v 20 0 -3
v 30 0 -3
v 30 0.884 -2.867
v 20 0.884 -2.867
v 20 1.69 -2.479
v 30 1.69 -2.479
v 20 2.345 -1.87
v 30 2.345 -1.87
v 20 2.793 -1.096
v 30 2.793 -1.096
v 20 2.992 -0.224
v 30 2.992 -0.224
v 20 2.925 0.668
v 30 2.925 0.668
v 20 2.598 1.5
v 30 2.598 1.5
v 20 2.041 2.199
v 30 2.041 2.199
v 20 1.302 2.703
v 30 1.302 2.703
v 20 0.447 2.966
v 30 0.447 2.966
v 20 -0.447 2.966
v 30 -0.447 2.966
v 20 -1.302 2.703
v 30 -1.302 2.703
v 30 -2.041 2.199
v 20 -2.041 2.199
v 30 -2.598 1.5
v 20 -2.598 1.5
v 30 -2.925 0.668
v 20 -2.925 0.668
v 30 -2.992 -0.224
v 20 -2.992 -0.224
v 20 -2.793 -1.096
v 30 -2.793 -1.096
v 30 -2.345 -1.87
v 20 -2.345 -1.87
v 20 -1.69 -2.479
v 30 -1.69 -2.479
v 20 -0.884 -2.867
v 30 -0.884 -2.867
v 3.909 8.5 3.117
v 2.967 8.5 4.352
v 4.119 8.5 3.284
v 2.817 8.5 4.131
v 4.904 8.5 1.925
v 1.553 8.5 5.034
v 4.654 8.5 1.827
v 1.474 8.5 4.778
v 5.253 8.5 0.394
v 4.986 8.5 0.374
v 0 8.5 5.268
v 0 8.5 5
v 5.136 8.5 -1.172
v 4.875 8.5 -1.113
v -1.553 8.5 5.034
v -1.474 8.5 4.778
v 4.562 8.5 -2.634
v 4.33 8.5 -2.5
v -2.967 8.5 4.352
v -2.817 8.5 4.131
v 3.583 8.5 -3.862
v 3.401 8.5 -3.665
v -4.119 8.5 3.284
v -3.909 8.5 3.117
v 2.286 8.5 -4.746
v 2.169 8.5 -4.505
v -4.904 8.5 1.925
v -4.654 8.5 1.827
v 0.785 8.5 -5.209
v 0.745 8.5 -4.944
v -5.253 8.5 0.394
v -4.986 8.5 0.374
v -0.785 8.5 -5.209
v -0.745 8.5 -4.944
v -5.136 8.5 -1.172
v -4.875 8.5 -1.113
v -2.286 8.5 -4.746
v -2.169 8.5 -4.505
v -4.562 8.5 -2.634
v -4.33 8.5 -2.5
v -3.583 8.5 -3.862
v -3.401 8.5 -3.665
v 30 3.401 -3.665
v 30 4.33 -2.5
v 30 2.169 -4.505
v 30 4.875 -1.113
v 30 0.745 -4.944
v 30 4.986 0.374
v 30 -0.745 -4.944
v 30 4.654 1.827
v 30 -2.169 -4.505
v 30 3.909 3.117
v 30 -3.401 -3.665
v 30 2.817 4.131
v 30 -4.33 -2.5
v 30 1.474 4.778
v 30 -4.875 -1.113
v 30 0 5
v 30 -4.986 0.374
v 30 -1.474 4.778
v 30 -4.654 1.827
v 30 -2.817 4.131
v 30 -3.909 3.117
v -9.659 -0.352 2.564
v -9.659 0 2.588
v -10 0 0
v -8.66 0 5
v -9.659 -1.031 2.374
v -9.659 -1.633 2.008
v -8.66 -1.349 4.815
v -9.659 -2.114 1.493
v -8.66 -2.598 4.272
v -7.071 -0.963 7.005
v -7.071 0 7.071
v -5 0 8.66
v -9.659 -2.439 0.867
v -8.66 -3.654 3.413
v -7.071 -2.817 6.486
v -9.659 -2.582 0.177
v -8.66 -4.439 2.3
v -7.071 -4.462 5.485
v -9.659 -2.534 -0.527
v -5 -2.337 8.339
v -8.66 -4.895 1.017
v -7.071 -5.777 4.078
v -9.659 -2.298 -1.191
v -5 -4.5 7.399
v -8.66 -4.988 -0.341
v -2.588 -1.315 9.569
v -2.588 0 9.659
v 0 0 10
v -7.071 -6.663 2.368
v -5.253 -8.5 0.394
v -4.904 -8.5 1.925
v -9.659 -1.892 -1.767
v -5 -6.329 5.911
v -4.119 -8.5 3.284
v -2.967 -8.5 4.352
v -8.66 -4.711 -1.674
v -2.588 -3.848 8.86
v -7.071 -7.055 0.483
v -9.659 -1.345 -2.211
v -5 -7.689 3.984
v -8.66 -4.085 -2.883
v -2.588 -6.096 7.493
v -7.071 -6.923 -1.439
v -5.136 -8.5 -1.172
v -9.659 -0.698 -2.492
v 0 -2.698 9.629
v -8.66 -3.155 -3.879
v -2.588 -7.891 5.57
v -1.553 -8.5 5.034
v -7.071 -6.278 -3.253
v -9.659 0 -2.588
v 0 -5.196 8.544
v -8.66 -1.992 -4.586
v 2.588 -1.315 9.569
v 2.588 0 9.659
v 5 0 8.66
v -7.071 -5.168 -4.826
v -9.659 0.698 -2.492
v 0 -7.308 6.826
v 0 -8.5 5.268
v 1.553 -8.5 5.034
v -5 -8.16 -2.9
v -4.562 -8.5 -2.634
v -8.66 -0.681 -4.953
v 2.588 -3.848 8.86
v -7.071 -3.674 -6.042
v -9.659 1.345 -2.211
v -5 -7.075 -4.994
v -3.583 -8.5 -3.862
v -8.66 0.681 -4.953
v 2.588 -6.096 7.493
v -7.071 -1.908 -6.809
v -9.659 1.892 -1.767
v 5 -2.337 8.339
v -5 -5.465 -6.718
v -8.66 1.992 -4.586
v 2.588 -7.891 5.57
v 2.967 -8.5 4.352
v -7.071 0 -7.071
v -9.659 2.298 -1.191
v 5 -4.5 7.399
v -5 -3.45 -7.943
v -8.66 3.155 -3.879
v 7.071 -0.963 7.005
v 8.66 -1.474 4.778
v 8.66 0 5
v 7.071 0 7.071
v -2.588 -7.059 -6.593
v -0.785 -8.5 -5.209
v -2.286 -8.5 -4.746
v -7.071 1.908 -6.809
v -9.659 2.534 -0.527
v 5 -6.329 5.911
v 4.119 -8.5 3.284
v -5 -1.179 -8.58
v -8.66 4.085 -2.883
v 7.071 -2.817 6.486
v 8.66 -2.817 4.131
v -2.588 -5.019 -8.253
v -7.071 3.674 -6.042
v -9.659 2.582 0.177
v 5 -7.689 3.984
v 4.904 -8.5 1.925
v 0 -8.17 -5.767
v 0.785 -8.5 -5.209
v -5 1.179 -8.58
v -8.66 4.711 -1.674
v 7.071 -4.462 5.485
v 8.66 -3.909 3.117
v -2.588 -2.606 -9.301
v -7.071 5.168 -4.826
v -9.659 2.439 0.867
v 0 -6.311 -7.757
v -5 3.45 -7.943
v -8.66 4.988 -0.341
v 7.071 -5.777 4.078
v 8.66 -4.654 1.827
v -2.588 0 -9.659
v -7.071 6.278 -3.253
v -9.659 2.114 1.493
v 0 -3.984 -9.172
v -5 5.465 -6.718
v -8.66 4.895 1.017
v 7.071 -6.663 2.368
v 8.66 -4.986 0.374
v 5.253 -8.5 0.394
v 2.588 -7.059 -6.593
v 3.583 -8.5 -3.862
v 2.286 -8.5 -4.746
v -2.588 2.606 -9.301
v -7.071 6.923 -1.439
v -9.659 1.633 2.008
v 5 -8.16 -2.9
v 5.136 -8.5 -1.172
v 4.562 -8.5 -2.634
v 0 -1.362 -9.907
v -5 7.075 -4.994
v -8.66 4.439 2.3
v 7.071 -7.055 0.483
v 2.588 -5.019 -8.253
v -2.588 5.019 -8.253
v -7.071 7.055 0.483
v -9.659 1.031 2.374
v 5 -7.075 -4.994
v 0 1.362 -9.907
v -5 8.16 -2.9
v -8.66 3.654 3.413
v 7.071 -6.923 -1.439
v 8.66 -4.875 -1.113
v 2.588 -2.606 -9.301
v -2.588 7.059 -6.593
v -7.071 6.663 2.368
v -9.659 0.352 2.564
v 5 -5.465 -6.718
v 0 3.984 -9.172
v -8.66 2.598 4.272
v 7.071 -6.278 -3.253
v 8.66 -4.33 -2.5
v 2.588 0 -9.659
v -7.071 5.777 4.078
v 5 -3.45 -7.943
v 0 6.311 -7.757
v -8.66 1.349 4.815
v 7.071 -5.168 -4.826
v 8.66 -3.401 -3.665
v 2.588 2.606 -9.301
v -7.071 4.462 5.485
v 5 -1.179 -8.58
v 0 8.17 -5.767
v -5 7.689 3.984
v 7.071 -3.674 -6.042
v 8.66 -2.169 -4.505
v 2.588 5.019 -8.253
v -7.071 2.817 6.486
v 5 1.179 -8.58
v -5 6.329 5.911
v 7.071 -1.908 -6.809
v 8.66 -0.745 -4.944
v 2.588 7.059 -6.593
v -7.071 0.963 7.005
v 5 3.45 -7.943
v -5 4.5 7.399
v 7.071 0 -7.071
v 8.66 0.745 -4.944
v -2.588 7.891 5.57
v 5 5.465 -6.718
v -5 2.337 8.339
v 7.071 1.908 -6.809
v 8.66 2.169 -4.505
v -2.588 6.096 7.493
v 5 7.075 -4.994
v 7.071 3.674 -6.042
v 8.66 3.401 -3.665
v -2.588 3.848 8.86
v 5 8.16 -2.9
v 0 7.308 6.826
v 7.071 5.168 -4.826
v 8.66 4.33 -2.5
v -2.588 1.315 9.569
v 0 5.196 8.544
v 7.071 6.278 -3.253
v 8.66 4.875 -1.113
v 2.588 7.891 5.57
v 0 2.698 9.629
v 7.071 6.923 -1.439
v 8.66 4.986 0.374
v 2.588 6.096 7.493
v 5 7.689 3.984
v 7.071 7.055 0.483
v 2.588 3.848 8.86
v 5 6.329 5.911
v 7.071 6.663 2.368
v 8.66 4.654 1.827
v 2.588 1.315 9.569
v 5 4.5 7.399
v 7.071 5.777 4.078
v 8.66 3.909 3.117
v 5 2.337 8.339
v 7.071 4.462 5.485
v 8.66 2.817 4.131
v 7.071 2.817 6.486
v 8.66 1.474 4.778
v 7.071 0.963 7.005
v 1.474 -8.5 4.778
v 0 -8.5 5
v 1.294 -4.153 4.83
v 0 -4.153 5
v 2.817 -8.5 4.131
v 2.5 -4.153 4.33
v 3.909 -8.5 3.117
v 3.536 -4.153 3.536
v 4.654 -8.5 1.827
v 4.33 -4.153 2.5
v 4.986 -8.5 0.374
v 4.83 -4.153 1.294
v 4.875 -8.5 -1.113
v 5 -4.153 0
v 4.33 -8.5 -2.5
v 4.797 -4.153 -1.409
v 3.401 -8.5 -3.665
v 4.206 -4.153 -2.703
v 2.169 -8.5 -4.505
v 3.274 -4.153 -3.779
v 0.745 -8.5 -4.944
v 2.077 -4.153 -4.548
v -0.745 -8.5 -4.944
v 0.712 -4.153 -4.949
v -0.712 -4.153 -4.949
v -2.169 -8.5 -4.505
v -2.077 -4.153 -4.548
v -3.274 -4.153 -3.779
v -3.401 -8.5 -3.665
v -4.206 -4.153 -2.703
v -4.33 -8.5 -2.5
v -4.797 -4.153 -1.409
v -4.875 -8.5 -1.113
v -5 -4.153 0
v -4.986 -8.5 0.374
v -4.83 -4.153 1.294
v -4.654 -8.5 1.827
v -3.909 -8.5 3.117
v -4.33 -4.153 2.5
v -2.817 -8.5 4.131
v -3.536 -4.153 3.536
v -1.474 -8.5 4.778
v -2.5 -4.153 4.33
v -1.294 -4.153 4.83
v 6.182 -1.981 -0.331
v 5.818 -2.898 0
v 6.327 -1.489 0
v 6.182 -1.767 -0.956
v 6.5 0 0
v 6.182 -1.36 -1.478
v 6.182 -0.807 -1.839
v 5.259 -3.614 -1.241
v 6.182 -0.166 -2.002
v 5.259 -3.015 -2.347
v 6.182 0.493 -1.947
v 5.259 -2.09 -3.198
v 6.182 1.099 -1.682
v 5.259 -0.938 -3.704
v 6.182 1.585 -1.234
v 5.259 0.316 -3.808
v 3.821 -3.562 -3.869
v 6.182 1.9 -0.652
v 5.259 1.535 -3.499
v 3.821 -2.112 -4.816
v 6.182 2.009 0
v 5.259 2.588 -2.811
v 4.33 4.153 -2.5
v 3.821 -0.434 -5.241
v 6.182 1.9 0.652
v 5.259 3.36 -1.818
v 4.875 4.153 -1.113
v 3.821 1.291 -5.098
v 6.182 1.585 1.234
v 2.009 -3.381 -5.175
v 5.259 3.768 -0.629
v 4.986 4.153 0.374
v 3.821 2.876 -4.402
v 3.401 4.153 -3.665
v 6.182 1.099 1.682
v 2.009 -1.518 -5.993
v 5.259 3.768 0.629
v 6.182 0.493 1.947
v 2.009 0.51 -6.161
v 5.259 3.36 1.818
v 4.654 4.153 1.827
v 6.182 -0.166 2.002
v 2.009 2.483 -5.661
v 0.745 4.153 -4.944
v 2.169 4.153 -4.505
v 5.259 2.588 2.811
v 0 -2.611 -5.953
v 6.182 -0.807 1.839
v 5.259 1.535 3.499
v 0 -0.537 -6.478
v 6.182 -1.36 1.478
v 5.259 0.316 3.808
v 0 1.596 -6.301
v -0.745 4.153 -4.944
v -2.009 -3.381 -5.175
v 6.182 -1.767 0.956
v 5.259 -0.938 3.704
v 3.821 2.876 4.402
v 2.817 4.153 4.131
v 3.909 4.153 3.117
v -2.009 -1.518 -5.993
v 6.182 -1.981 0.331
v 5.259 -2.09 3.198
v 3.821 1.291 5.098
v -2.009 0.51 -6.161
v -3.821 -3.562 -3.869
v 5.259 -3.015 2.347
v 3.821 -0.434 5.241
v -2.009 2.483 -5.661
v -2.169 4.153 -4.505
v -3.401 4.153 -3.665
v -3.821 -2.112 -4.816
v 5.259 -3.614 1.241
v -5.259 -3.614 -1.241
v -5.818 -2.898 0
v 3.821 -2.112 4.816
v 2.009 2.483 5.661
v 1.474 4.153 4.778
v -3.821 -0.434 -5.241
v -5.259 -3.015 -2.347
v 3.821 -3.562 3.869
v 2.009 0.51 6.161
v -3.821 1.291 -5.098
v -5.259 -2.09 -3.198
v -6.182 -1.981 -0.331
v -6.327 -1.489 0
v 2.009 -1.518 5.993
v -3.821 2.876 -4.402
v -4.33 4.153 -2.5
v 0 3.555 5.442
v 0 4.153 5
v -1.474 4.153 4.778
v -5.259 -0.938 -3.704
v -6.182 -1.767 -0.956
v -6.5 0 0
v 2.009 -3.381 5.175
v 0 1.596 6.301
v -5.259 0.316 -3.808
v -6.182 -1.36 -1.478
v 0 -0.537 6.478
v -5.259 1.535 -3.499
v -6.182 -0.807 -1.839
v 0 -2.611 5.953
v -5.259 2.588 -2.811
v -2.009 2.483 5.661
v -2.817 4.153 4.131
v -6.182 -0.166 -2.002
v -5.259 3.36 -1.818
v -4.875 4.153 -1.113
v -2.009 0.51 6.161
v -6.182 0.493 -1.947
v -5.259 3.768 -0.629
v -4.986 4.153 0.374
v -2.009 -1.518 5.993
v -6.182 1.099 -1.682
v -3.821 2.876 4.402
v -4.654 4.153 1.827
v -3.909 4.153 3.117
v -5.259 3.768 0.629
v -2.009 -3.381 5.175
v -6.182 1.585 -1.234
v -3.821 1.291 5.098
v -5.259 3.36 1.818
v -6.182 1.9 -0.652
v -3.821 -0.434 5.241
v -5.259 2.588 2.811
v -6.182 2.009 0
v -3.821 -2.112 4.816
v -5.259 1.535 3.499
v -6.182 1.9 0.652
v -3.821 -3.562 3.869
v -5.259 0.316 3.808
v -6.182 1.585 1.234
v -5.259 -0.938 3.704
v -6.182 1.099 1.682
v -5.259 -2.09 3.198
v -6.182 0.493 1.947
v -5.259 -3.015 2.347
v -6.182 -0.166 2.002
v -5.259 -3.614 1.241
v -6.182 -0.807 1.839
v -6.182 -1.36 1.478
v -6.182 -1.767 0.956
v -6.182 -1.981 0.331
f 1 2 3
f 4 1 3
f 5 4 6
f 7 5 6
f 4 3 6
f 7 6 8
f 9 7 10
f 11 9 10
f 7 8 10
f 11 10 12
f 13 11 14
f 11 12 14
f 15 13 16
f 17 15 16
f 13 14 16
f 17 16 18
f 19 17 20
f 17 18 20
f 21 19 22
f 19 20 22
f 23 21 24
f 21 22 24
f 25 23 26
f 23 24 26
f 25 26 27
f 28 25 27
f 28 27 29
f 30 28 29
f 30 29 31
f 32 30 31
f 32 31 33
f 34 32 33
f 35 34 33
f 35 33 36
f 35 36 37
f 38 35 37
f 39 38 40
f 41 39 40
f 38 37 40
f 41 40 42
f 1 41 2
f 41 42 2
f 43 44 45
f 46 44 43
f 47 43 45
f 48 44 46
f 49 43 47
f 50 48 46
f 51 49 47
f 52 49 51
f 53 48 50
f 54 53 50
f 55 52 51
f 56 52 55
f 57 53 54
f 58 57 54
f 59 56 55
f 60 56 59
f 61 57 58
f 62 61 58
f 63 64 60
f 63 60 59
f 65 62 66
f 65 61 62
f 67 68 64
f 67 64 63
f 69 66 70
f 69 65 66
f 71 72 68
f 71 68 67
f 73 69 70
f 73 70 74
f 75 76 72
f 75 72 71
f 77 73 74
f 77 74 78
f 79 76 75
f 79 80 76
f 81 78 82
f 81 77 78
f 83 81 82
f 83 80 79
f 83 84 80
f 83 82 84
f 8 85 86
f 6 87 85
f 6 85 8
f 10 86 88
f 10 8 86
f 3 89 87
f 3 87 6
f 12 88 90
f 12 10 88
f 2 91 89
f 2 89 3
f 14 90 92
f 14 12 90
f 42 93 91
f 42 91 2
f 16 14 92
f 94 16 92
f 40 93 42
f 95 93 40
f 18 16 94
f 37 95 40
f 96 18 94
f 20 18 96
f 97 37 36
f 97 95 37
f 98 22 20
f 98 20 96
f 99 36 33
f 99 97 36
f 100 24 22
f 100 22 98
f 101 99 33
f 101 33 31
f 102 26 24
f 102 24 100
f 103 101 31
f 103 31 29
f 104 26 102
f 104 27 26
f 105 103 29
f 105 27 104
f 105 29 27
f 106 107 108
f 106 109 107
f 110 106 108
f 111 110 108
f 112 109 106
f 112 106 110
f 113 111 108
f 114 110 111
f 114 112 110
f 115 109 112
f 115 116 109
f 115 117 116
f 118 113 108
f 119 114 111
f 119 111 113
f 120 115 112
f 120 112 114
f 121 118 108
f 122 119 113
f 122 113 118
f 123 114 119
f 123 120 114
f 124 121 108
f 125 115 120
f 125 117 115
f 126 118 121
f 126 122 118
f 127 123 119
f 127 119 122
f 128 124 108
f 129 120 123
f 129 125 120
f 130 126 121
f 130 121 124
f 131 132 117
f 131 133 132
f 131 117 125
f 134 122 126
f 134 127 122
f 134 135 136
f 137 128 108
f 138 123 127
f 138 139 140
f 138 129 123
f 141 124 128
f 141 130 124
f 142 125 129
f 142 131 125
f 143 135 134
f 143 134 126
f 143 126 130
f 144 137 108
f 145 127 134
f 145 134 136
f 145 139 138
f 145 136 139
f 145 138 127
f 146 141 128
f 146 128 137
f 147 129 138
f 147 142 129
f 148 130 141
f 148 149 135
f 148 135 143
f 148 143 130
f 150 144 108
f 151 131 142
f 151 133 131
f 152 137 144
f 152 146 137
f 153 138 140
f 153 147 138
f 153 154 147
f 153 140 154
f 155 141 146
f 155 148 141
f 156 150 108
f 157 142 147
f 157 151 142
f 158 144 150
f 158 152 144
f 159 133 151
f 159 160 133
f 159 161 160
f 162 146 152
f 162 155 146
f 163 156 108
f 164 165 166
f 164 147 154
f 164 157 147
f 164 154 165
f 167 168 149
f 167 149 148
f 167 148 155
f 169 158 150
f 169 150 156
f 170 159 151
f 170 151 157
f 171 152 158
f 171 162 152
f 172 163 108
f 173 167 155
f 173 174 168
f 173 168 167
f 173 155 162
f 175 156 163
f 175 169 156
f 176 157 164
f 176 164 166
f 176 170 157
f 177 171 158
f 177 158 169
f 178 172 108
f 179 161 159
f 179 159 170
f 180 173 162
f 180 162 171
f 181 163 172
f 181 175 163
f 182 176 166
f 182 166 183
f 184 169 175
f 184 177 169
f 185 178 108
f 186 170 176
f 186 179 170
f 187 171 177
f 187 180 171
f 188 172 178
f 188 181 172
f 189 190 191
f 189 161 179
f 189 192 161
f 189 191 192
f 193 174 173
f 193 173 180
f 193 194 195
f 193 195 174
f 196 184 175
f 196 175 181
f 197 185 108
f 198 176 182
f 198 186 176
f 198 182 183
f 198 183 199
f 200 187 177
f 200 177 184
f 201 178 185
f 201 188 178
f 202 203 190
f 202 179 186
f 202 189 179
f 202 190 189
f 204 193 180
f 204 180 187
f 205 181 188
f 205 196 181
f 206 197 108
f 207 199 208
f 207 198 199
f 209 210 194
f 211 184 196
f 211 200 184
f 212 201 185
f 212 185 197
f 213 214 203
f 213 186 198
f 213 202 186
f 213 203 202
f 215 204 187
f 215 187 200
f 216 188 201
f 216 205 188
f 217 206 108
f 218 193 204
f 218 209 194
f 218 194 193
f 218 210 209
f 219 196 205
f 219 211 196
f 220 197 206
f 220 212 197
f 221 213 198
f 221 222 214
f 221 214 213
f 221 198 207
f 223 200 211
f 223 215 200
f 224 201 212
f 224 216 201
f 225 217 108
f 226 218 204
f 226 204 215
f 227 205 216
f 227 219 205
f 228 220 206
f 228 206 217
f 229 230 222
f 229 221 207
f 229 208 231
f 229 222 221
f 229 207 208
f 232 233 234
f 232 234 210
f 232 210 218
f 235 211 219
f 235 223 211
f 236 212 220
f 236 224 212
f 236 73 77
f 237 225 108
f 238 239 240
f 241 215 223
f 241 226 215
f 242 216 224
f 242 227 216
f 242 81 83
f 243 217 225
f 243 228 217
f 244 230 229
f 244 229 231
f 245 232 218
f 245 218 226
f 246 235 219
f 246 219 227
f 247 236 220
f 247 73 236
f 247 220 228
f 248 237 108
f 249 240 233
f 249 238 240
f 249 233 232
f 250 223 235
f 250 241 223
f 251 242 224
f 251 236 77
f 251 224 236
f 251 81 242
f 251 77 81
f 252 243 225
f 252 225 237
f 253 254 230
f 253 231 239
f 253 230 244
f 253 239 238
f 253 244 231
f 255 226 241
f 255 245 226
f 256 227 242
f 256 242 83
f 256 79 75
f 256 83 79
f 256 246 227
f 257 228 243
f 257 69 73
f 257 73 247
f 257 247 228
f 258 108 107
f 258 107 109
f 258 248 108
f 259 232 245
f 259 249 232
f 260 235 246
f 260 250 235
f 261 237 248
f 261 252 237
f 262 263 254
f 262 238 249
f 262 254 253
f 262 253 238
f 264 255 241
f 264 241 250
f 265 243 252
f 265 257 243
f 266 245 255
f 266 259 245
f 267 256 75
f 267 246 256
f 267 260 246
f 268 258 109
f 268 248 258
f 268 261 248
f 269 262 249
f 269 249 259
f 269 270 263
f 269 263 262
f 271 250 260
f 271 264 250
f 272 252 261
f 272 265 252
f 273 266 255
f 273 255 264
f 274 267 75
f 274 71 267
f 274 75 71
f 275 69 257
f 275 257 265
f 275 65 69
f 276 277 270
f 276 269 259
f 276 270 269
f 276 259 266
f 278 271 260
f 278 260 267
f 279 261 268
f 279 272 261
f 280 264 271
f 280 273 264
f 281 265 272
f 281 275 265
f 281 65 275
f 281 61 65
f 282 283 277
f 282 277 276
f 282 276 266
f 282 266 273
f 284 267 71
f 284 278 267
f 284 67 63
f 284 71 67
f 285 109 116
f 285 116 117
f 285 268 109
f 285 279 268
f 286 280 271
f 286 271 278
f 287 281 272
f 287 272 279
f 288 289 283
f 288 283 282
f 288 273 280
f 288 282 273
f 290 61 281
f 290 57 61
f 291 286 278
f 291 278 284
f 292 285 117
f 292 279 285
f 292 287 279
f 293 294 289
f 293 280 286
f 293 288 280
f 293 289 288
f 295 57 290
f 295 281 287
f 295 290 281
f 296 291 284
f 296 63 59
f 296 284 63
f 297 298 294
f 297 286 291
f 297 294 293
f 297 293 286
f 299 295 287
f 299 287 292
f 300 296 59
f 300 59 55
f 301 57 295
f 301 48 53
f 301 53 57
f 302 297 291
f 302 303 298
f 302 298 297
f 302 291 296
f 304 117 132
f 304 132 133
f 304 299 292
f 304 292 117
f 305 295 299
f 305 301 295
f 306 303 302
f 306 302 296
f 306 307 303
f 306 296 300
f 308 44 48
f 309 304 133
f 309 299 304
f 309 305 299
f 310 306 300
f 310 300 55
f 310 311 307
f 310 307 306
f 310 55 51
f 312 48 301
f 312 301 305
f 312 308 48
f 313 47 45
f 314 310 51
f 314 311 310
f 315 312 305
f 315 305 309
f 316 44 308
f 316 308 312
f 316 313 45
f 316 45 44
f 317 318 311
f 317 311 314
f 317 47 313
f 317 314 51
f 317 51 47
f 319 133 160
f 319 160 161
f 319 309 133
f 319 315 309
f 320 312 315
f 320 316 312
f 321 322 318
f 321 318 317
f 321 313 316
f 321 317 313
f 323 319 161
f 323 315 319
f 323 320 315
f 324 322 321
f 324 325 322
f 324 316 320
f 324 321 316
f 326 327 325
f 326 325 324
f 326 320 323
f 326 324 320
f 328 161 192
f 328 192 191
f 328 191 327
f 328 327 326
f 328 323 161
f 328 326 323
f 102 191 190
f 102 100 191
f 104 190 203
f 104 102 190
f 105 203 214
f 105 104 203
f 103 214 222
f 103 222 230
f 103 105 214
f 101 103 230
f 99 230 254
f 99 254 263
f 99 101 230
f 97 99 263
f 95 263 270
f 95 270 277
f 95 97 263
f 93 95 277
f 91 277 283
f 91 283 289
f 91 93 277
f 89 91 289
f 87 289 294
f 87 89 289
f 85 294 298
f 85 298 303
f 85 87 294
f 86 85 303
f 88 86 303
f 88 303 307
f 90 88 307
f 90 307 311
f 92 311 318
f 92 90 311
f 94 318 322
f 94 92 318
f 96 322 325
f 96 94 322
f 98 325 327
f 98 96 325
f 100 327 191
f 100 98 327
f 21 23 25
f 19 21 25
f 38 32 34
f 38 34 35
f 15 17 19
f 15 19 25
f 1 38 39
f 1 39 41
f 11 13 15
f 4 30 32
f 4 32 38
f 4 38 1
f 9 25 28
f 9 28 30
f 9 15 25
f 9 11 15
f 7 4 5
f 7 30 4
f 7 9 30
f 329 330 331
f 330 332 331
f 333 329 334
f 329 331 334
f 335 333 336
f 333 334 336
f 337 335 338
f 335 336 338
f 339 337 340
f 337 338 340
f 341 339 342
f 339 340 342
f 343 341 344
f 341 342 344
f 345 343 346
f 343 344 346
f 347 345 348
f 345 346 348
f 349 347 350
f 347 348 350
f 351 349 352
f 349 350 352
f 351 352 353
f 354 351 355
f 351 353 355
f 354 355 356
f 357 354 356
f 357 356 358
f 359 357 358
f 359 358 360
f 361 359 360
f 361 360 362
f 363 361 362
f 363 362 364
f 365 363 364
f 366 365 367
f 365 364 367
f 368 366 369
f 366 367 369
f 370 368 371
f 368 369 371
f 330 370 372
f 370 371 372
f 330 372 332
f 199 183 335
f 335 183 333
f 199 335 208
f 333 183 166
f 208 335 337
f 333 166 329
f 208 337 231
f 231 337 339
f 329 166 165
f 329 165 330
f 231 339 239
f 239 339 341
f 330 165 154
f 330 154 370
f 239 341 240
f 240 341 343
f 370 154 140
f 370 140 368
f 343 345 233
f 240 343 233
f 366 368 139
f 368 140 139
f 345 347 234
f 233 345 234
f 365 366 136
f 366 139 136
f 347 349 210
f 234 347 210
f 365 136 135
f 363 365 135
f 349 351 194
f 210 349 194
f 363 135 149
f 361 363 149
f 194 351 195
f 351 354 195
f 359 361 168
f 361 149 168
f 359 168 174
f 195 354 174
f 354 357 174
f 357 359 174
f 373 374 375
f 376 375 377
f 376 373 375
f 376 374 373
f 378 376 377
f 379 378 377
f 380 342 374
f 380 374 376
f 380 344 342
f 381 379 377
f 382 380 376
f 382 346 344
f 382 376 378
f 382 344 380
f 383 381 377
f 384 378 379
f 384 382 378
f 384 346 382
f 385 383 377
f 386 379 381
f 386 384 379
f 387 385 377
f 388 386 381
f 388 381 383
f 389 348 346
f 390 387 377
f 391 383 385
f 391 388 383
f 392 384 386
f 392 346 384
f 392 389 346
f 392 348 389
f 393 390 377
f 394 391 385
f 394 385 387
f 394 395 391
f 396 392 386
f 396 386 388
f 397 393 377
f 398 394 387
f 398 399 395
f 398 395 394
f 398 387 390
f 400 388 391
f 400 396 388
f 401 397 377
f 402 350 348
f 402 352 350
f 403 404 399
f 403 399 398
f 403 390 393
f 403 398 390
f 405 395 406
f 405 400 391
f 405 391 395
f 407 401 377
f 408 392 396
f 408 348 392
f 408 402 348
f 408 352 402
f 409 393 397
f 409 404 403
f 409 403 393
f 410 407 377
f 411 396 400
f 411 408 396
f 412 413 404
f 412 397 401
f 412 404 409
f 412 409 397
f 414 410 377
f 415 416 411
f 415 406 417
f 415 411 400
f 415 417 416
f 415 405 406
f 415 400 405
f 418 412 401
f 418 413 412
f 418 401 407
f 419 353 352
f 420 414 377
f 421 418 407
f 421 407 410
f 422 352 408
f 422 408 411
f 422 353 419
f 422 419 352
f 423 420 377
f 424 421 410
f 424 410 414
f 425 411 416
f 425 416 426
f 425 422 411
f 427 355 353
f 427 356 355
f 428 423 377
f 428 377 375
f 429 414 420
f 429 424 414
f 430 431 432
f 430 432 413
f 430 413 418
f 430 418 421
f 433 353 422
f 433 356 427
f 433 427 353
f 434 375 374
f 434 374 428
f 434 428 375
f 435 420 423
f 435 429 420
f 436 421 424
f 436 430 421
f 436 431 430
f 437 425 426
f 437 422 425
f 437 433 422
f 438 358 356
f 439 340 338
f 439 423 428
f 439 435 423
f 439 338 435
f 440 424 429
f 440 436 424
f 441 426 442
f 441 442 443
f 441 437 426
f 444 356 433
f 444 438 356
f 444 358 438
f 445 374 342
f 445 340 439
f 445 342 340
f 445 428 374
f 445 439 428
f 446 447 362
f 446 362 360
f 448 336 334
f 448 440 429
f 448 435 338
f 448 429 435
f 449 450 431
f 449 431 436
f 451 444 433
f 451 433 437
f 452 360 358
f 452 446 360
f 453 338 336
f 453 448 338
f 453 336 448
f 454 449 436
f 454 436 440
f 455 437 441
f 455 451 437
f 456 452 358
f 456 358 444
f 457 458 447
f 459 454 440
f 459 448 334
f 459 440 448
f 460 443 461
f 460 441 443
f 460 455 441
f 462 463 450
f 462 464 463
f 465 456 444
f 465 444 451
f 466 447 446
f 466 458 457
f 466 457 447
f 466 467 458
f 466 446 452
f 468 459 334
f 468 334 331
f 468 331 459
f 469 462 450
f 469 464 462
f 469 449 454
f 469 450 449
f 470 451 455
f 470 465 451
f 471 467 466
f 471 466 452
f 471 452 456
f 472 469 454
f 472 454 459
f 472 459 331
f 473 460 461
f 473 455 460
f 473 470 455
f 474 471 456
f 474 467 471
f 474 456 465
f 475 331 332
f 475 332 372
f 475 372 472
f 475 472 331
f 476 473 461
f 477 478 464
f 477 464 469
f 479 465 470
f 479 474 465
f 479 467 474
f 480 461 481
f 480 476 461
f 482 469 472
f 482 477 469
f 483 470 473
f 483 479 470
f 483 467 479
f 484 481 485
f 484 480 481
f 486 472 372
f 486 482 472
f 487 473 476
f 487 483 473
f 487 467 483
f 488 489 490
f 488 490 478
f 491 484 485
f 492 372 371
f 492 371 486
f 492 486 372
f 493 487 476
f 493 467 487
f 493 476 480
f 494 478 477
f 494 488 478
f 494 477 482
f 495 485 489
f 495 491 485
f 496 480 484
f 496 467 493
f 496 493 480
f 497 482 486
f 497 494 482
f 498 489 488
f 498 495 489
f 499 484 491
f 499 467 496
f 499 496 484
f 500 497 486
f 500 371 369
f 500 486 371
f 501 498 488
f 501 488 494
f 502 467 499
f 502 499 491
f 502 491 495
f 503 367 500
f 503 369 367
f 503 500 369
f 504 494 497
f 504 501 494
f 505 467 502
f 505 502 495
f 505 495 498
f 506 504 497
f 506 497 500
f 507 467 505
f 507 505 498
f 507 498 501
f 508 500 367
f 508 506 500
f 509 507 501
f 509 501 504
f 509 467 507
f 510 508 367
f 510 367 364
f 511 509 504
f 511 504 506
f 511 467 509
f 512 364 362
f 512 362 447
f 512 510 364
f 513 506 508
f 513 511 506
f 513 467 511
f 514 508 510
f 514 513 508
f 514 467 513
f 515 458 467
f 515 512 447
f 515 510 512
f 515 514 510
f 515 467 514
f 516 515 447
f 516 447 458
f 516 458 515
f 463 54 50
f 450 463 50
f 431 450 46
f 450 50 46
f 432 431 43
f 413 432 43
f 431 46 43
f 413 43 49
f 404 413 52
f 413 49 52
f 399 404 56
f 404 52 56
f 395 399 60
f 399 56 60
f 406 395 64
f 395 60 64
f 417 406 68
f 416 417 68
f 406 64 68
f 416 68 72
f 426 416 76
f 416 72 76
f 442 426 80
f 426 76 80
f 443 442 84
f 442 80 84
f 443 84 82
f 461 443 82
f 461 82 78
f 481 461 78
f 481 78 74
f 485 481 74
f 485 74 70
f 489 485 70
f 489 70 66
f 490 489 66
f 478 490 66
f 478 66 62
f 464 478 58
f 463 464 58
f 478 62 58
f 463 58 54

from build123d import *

# Parameters (mm, degrees)
SKETCH3_R                    = 3
CUT_EXTRUDE2_DEPTH           = 10
SKETCH4_R                    = 5
CUT_EXTRUDE3_DEPTH           = 15
CUT_EXTRUDE_THIN2_DEPTH      = 10
CUT_EXTRUDE_THIN2_DEPTH_BACK = 10
SKETCH5_W                    = 45
SKETCH5_H                    = 37
SKETCH5_W_2                  = 25
SKETCH5_H_2                  = 17


with BuildPart() as part:
    # Sketch1 → Revolve3 (revolve)
    with BuildSketch(Plane.XY, mode=Mode.PRIVATE) as revolve3_sk:
        with BuildLine():
            Line((30, -5), (30, 0))
            Line((30, 0), (5, 0))
            ThreePointArc((5, 0), (0, -5), (-5, 0))
            Line((-5, 0), (-10, 0))
            ThreePointArc((-10, 0), (-2.588190451, -9.659258263), (8.660254038, -5))
            Line((8.660254038, -5), (30, -5))
        make_face()
    revolve(revolve3_sk.sketch.rotate(Axis((-13.11573237, 0, 0), (1, 0, 0)), 270), axis=Axis((-13.11573237, 0, 0), (1, 0, 0)))

    # Sketch3 → Cut-Extrude2 (cut)
    with BuildSketch(Plane(origin=(30, 0, 0), x_dir=(0, 0, -1), z_dir=(1, 0, 0))):
        Circle(SKETCH3_R)
    extrude(amount=-CUT_EXTRUDE2_DEPTH, mode=Mode.SUBTRACT)

    # Sketch2 → Cut-Revolve1 (revolve, cut)
    with BuildSketch(Plane.XY):
        with BuildLine():
            Line((-6.5, 0), (6.5, 0))
            ThreePointArc((6.5, 0), (0, -6.5), (-6.5, 0))
        make_face()
    revolve(axis=Axis((-6.5, 0, 0), (1, 0, 0)), mode=Mode.SUBTRACT)

    # Sketch4 → Cut-Extrude3 (cut, symmetric)
    with BuildSketch(Plane(origin=(0, 0, 0), x_dir=(1, 0, 0), z_dir=(0, 1, 0))):
        with Locations(Location((0, 0, 0), (0, 0, 270))):
            Circle(SKETCH4_R)
    extrude(amount=CUT_EXTRUDE3_DEPTH, both=True, mode=Mode.SUBTRACT)

    # Sketch5 → Cut-Extrude-Thin2 (cut, two sides: drawn at the far end of the back side and taken through both)
    with BuildSketch(Plane(origin=(0, 0, 0), x_dir=(0, 0, -1), z_dir=(1, 0, 0)).offset(-CUT_EXTRUDE_THIN2_DEPTH_BACK)):
        Rectangle(SKETCH5_W, SKETCH5_H)
        Rectangle(SKETCH5_W_2, SKETCH5_H_2, mode=Mode.SUBTRACT)
    extrude(amount=CUT_EXTRUDE_THIN2_DEPTH + CUT_EXTRUDE_THIN2_DEPTH_BACK, mode=Mode.SUBTRACT)


solid = part.part
